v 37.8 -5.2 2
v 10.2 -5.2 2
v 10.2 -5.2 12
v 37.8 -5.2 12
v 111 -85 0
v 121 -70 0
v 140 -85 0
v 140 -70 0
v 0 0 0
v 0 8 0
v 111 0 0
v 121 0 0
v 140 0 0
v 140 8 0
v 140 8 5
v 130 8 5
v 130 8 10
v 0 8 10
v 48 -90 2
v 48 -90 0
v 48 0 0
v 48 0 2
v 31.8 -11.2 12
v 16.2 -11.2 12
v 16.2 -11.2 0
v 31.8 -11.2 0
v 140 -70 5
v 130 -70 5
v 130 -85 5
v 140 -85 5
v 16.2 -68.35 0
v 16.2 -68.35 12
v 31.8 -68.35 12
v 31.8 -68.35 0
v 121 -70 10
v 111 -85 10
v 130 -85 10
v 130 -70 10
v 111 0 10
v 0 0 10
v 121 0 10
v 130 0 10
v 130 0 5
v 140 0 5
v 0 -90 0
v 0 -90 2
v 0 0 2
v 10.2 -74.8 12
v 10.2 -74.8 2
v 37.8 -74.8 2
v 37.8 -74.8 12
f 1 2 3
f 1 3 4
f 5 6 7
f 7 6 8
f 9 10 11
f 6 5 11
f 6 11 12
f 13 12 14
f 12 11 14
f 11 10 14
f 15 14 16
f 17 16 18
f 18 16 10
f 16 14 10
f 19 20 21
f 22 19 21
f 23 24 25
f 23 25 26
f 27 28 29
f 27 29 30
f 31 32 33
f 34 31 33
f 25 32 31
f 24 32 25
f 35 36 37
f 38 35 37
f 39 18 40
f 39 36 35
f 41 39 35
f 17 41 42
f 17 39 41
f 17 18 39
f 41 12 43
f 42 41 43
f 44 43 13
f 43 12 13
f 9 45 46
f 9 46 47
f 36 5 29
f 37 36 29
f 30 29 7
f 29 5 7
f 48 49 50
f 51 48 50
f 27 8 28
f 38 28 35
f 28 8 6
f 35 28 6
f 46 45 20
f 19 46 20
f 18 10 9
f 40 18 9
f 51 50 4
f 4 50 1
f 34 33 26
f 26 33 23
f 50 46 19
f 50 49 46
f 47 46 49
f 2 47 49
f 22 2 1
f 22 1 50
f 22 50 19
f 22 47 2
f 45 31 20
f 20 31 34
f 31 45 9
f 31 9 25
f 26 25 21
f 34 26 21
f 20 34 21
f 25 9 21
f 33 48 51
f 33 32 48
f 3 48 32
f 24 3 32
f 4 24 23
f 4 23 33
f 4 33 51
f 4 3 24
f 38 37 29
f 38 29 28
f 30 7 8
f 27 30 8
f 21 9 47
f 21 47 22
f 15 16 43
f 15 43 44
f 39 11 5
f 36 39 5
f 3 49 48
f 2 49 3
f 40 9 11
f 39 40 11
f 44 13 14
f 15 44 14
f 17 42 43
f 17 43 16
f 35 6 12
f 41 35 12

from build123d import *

# Parameters (mm, degrees)
PAD_DEPTH       = 10
SKETCH002_W     = 10
SKETCH002_H     = 93
POCKET_DEPTH    = 5
SKETCH003_W     = 48
SKETCH003_H     = 90
PAD001_DEPTH    = 2
SKETCH004_W     = 27.6
SKETCH004_H     = 69.6
PAD002_DEPTH    = 10
SKETCH005_W     = 15.6
SKETCH005_H     = 57.150113
POCKET001_DEPTH = 15


with BuildPart() as body:
    # Sketch → Pad (new body)
    with BuildSketch(Plane.XY):
        Polygon((140, 8), (0, 8), (0, 0), (111, 0), (111, -85), (121, -85), (140, -85), (140, -70), (121, -70), (121, 0), (140, 0), align=None)
    extrude(amount=PAD_DEPTH)

    # Sketch002 (on Face13 of Pad) → Pocket (cut)
    with BuildSketch(Plane.XY.offset(10)):
        with Locations((135, -38.5)):
            Rectangle(SKETCH002_W, SKETCH002_H)
    extrude(amount=-POCKET_DEPTH, mode=Mode.SUBTRACT)


with BuildPart() as body001:
    # Sketch003 → Pad001 (new body)
    with BuildSketch(Plane.XY):
        with Locations((24, -45)):
            Rectangle(SKETCH003_W, SKETCH003_H)
    extrude(amount=PAD001_DEPTH)

    # Sketch004 (on Face6 of Pad001) → Pad002 (join)
    with BuildSketch(Plane.XY.offset(2)):
        with Locations((24, -40)):
            Rectangle(SKETCH004_W, SKETCH004_H)
    extrude(amount=PAD002_DEPTH)

    # Sketch005 (on Face11 of Pad002) → Pocket001 (cut)
    with BuildSketch(Plane.XY.offset(12)):
        with Locations((24, -39.775056)):
            Rectangle(SKETCH005_W, SKETCH005_H)
    extrude(amount=-POCKET001_DEPTH, mode=Mode.SUBTRACT)


solid = Compound([body.part, body001.part])
